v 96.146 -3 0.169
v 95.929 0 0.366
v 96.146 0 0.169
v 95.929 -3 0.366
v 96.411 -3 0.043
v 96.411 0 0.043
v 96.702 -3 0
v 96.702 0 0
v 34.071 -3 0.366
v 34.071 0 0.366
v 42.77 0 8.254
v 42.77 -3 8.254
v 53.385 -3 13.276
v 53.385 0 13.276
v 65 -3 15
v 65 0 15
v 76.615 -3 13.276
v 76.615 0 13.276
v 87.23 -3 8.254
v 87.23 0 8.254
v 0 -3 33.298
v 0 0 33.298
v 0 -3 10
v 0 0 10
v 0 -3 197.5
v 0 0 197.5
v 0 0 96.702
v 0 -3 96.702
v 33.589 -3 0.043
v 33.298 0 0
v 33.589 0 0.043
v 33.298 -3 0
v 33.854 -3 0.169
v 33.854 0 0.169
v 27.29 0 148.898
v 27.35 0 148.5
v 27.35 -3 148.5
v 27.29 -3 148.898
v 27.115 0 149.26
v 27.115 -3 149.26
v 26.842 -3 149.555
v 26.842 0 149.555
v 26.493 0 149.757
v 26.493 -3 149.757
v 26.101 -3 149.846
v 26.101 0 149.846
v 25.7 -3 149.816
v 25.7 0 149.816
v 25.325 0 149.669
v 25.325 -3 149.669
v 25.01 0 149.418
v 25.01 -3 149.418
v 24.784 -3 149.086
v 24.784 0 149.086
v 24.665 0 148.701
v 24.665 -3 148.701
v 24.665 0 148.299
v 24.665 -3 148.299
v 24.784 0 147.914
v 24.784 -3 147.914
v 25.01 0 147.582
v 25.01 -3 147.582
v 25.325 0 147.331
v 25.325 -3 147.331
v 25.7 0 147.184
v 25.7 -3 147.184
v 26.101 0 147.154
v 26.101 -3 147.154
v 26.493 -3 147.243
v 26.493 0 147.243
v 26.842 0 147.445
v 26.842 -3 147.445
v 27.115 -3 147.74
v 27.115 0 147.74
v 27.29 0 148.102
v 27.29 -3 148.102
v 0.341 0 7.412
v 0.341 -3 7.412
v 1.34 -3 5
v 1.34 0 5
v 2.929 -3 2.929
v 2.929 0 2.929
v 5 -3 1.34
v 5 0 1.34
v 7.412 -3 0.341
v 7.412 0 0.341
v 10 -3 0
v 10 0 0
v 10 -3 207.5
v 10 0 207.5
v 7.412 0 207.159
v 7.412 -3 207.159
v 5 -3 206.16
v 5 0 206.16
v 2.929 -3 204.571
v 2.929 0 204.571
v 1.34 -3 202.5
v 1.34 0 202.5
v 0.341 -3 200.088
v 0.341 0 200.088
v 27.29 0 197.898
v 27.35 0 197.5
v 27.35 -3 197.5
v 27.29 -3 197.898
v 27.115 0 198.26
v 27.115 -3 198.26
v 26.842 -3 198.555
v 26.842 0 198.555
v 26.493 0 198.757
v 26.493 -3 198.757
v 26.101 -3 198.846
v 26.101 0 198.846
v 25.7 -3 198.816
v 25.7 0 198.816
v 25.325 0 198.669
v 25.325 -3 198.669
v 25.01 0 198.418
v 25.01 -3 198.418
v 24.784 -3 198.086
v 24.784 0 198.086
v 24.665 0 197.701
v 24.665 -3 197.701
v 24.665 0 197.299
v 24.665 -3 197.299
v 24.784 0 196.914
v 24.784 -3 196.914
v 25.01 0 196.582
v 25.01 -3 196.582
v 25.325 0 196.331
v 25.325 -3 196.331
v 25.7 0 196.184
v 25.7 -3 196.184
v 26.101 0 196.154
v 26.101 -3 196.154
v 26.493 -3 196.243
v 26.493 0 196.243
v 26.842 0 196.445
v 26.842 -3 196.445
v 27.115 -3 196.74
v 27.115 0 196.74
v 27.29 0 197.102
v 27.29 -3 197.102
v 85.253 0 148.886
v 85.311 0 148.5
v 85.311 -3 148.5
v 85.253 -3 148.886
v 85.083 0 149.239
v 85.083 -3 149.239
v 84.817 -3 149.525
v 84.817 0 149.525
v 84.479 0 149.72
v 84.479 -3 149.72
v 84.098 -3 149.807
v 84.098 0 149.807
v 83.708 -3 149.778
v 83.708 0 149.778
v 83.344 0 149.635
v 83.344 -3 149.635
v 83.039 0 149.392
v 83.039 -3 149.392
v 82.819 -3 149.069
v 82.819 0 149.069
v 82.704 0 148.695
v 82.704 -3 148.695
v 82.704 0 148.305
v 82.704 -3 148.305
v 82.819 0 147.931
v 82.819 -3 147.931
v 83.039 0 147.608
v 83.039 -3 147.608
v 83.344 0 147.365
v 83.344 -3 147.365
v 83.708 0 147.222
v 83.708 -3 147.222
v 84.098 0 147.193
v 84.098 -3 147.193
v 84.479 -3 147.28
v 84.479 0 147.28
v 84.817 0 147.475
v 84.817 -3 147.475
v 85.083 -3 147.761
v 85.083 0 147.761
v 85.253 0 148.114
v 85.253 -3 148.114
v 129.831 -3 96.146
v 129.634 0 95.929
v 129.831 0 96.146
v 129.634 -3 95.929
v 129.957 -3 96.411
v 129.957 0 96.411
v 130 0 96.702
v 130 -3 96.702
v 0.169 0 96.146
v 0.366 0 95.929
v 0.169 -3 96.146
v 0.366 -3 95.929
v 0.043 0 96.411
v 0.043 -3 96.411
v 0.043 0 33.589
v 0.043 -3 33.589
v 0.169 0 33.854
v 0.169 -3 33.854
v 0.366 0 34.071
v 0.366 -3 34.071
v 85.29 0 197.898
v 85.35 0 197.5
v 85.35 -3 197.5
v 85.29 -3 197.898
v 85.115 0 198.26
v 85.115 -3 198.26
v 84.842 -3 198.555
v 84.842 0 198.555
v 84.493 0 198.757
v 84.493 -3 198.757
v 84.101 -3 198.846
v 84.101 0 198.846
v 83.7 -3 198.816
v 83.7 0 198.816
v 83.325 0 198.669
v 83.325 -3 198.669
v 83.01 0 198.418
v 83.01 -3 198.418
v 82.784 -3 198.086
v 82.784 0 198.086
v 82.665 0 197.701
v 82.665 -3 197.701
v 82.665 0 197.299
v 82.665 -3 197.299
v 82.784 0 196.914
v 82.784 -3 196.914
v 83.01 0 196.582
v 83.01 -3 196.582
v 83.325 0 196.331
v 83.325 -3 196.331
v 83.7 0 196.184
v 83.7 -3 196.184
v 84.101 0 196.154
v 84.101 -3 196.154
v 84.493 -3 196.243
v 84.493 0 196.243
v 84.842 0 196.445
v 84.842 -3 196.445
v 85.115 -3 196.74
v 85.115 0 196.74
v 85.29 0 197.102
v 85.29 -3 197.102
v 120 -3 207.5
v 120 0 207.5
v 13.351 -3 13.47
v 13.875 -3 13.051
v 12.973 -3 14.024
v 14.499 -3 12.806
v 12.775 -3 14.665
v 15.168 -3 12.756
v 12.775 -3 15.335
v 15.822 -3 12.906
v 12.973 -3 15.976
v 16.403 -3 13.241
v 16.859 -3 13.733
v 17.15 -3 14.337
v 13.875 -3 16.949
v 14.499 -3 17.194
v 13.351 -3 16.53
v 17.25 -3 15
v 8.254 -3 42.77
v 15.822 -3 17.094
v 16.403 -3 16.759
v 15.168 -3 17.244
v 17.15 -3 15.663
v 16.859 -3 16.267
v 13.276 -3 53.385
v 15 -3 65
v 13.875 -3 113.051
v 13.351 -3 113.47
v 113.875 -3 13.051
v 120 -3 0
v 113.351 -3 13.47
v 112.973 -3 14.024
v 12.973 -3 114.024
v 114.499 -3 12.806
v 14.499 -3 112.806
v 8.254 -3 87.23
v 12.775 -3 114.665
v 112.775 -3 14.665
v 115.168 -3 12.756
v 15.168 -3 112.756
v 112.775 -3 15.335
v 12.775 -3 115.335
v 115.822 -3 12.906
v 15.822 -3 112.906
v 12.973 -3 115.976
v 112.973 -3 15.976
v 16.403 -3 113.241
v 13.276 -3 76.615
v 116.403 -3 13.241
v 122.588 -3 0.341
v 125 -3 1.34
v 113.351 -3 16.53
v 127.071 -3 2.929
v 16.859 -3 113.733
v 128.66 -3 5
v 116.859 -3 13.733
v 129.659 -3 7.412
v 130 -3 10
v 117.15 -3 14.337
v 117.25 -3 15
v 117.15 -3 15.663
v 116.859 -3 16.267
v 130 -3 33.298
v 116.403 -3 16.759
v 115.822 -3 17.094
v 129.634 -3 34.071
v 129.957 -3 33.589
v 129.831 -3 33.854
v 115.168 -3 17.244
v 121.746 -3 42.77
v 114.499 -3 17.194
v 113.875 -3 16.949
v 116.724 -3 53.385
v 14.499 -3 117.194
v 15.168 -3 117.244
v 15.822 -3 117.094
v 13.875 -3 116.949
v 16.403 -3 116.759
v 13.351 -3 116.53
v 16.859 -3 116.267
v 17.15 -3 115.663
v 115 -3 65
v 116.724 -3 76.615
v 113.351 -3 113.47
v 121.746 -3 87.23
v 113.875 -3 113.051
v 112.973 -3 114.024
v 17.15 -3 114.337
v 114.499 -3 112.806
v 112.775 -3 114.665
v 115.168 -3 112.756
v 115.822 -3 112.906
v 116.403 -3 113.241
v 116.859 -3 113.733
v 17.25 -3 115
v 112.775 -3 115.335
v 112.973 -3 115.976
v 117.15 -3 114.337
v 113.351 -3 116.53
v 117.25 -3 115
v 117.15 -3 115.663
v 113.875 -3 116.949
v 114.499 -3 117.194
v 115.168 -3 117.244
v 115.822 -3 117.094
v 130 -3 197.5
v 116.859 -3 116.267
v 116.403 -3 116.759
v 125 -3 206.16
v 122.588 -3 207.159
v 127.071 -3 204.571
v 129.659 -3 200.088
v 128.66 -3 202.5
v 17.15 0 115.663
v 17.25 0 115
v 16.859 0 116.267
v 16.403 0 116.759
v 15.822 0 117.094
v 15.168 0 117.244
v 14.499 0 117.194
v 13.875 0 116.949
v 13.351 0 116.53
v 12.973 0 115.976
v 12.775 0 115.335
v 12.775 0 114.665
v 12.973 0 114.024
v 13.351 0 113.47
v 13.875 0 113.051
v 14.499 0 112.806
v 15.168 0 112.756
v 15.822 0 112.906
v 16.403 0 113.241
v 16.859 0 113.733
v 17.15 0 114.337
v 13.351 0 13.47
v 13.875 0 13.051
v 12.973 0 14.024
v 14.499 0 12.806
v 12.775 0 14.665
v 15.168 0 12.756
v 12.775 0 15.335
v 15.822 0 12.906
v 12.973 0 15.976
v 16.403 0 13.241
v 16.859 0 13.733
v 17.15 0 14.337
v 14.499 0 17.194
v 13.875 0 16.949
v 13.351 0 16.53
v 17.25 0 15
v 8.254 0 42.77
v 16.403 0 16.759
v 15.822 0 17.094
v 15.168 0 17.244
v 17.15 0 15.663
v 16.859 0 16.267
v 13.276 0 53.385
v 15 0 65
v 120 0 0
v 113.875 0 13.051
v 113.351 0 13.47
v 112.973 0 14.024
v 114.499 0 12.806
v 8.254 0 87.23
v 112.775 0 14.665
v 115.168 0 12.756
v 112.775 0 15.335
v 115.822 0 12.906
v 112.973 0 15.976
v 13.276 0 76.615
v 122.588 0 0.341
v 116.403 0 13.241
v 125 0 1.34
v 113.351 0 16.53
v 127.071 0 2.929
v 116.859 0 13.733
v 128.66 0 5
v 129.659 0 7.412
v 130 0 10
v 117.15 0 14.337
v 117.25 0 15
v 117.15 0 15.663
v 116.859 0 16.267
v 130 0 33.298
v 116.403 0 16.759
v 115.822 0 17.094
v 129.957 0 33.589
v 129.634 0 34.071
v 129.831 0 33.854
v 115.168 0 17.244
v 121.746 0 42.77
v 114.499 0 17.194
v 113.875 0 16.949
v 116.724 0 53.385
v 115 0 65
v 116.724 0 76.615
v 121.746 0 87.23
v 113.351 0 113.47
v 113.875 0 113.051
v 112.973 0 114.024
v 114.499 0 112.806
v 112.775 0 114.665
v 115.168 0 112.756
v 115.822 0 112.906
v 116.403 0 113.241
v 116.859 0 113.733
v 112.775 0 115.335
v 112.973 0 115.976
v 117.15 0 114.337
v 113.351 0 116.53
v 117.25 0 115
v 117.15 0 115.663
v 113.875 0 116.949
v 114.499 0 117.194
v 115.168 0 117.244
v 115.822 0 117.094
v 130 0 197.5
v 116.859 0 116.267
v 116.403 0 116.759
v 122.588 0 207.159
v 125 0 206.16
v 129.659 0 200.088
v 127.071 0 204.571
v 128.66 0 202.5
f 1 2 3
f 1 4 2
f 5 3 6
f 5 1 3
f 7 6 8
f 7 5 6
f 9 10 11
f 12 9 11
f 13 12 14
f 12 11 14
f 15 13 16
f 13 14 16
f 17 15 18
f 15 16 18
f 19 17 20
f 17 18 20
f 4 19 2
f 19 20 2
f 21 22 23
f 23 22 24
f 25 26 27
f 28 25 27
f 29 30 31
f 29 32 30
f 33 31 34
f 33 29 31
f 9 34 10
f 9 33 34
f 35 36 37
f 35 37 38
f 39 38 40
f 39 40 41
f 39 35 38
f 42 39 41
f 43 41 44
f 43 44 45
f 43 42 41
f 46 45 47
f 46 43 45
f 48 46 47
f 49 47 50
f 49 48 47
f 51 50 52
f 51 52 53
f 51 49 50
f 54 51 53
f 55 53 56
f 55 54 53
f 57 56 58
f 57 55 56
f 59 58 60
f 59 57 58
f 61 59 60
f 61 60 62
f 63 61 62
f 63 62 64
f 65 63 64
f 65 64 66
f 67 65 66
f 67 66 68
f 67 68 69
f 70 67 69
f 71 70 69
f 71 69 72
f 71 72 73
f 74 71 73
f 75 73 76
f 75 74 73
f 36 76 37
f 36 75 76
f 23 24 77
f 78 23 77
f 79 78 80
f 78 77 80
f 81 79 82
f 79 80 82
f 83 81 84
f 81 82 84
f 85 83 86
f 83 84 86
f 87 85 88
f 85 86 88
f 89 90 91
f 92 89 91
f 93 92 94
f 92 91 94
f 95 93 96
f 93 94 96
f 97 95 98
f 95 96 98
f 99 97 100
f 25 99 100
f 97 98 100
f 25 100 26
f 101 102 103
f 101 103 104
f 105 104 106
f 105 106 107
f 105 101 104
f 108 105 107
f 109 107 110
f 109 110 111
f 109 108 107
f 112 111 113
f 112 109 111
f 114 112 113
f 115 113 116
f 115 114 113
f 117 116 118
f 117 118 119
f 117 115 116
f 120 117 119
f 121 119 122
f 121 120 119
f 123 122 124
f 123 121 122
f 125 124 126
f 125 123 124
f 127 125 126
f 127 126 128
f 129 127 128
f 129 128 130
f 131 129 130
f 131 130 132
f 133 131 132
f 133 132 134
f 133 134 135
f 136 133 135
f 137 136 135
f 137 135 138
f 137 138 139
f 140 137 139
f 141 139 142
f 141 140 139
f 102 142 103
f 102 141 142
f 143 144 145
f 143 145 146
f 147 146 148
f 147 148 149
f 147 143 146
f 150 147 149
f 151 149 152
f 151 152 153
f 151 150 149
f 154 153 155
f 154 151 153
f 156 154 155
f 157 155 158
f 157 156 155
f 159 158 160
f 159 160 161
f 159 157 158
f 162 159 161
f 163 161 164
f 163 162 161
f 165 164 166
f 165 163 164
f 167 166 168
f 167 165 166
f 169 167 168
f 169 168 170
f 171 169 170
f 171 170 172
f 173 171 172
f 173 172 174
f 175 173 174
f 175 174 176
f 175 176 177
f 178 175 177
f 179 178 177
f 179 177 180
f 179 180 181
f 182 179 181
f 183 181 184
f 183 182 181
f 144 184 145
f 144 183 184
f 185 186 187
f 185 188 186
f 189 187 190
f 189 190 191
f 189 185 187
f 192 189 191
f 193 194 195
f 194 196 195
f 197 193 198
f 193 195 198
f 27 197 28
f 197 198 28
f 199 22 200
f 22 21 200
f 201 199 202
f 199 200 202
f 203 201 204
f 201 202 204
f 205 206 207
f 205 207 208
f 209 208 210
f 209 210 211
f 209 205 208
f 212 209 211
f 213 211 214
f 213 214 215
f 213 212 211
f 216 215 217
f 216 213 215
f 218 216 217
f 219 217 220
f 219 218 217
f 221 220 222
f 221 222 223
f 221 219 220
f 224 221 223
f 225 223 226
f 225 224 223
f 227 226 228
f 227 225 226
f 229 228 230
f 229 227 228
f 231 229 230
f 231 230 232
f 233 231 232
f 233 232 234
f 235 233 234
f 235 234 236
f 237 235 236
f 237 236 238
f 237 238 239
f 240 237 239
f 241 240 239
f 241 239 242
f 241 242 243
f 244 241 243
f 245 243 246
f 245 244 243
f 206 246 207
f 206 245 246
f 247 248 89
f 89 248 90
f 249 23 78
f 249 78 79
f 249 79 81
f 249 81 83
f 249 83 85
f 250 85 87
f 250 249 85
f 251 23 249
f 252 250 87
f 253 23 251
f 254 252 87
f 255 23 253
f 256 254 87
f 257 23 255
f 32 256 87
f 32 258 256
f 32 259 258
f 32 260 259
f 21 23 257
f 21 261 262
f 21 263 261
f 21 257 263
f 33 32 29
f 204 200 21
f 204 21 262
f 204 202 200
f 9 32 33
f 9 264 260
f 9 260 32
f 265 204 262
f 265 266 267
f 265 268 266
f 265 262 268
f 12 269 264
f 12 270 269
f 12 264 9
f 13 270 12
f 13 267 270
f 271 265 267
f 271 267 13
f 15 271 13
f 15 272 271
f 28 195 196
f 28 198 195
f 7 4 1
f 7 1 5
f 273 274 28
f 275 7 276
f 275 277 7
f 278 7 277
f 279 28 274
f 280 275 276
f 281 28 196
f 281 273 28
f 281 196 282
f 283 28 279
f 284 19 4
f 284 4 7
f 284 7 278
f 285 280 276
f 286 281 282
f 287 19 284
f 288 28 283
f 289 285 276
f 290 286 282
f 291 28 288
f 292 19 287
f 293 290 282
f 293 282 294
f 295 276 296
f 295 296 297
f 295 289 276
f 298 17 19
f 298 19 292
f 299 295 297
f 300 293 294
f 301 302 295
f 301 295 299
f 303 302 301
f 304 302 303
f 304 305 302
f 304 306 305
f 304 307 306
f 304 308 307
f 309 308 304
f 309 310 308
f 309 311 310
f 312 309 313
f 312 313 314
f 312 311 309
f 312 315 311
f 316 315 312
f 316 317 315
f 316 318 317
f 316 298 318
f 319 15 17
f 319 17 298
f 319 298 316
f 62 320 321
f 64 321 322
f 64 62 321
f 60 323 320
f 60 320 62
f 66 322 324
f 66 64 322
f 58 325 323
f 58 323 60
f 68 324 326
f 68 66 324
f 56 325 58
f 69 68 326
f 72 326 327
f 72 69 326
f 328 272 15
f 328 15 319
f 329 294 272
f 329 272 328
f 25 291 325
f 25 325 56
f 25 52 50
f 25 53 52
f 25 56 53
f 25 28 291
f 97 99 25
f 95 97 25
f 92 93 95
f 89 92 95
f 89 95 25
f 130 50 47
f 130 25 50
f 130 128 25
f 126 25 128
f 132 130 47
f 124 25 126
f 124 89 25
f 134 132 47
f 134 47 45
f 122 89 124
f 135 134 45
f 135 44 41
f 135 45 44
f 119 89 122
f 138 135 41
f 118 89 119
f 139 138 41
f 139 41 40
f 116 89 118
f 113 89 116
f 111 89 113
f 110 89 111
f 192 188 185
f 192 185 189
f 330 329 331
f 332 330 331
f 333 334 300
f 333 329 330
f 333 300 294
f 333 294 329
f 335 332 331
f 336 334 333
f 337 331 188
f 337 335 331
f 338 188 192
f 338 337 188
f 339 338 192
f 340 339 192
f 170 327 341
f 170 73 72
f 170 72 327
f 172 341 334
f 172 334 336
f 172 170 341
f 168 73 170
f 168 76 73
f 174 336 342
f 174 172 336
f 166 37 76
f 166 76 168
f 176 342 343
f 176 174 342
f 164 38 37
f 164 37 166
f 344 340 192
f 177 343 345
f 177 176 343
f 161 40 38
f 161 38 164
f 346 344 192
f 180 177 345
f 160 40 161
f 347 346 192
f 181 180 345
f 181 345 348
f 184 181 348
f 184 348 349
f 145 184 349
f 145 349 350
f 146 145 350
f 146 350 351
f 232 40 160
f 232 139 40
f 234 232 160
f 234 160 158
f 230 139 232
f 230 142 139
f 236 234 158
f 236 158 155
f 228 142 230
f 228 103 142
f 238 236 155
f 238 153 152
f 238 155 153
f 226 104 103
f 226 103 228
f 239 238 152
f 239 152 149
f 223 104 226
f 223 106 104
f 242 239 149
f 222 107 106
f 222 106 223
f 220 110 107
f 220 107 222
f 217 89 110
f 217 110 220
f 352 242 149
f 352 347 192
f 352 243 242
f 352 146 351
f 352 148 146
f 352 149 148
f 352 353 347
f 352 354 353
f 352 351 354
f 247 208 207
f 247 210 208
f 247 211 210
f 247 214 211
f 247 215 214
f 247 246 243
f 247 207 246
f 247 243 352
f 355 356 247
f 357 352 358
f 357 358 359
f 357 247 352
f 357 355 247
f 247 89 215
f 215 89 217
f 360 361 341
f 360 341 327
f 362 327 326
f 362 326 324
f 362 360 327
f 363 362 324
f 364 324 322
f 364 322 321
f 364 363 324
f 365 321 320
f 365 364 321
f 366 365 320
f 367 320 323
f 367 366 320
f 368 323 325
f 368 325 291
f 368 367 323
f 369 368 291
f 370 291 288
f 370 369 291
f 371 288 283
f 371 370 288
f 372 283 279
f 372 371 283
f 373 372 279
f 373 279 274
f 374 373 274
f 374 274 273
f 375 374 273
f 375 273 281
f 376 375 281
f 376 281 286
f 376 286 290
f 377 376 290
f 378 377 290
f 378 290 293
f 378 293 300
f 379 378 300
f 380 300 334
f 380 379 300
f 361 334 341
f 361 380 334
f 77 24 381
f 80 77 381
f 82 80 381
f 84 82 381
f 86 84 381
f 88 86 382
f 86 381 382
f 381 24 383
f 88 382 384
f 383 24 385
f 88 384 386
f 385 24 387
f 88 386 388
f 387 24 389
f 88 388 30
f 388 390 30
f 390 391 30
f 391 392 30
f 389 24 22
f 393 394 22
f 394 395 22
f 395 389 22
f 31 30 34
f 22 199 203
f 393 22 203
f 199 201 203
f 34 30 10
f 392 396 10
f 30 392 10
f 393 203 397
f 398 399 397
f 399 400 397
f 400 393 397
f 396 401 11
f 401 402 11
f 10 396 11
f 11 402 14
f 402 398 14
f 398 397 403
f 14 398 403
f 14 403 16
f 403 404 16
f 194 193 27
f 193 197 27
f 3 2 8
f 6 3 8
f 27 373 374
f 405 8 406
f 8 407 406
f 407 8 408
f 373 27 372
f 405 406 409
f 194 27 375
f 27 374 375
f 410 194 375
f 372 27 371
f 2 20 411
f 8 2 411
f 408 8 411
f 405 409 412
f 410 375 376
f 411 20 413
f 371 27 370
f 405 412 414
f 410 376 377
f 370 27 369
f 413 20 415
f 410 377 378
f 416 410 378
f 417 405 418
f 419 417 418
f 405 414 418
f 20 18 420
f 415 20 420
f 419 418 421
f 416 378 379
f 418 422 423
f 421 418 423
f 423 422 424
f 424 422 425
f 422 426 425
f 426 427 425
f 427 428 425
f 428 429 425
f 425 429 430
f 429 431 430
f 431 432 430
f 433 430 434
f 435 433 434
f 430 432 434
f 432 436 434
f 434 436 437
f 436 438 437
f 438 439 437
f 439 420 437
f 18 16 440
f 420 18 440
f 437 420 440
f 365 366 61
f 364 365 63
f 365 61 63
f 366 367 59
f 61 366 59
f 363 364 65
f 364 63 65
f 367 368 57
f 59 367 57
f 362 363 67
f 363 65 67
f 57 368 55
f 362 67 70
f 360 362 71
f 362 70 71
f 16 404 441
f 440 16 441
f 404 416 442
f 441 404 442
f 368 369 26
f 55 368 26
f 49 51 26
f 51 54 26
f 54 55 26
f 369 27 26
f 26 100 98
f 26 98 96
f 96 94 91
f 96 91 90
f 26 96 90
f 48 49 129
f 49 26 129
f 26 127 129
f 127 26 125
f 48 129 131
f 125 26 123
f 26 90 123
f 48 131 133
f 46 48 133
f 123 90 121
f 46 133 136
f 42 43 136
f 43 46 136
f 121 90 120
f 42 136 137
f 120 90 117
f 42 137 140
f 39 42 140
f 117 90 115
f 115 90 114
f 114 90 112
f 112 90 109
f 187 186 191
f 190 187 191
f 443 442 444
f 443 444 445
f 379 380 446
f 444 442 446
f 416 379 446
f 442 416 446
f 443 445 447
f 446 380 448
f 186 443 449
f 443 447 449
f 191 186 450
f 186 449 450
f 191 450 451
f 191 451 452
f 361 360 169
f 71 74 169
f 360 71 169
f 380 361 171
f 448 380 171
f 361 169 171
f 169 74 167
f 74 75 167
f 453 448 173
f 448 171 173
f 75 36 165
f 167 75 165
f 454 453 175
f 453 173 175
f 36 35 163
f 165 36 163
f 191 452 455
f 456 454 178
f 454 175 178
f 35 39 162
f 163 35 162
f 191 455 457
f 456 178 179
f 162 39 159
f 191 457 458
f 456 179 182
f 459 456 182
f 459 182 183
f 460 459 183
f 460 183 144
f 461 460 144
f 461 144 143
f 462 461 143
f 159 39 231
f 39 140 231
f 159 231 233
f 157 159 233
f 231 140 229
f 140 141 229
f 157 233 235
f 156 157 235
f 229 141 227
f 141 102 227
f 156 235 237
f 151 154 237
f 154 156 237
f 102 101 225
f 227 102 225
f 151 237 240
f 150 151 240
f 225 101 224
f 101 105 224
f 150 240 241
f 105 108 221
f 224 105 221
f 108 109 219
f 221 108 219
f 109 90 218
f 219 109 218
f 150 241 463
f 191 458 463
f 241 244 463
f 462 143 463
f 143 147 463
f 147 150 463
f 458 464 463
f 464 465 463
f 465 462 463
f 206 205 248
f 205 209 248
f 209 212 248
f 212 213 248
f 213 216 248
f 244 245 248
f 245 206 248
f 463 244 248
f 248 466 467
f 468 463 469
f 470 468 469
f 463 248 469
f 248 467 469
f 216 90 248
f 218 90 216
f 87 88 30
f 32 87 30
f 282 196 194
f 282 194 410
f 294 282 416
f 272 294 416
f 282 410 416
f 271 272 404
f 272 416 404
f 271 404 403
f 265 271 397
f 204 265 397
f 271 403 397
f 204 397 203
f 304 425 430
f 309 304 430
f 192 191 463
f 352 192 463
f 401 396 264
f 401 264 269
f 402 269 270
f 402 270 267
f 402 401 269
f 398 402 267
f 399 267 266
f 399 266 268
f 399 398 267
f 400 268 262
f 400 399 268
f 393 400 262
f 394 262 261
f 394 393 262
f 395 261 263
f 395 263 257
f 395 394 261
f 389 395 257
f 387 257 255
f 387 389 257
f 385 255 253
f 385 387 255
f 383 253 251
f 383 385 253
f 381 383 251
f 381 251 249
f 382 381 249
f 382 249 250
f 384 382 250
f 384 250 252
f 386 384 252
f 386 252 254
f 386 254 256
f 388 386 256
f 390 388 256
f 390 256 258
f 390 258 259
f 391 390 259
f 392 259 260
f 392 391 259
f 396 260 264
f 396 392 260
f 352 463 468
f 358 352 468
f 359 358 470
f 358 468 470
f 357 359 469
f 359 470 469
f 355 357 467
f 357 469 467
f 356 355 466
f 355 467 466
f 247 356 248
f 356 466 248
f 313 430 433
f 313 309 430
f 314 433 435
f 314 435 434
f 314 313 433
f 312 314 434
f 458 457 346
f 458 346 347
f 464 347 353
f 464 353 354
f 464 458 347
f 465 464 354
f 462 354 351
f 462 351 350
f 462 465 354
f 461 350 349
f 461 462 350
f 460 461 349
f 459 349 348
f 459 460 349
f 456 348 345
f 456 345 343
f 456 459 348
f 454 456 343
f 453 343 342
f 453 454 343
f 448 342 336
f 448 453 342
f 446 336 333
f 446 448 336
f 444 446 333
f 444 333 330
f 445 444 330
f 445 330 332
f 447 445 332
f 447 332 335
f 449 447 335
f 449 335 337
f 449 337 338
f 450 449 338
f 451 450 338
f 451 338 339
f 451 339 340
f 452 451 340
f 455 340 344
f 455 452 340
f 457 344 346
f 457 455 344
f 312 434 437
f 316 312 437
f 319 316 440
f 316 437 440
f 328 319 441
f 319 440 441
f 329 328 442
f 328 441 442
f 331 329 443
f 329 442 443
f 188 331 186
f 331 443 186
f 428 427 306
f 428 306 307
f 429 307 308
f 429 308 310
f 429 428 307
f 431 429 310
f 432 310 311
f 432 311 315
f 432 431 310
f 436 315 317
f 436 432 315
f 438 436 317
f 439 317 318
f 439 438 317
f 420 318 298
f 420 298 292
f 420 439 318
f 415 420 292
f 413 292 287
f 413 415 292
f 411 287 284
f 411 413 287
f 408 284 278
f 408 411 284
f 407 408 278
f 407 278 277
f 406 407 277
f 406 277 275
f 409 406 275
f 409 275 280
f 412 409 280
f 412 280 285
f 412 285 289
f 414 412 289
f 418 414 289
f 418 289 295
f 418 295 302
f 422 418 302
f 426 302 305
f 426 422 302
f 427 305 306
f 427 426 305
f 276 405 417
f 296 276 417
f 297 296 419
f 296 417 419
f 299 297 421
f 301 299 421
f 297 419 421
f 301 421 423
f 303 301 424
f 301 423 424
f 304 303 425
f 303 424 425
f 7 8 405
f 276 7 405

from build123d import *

# Parameters (mm, degrees)
F0_R     = 2.25
F0_R_2   = 1.35
F0_R_3   = 1.3110502125
F1_DEPTH = 3
F2_R     = 1


with BuildPart() as f1:
    # F0 (on Front) → F1 (new body)
    with BuildSketch(Plane.XZ):
        with BuildLine():
            ThreePointArc((0, 10), (2.9289321881, 2.9289321881), (10, 0))
            Line((10, 0), (33.775010008, 0))
            ThreePointArc((33.775010008, 0), (65, 15), (96.224989992, 0))
            Line((96.224989992, 0), (120, 0))
            ThreePointArc((120, 0), (127.0710678119, 2.9289321881), (130, 10))
            Line((130, 10), (130, 33.775010008))
            ThreePointArc((130, 33.775010008), (115, 65), (130, 96.224989992))
            Line((130, 96.224989992), (130, 197.5))
            ThreePointArc((130, 197.5), (127.0710678119, 204.5710678119), (120, 207.5))
            Line((120, 207.5), (10, 207.5))
            ThreePointArc((10, 207.5), (2.9289321881, 204.5710678119), (0, 197.5))
            Line((0, 197.5), (0, 96.224989992))
            ThreePointArc((0, 96.224989992), (15, 65), (0, 33.775010008))
            Line((0, 33.775010008), (0, 10))
        make_face()
        with Locations((15, 15)):
            Circle(F0_R, mode=Mode.SUBTRACT)
        with Locations((115, 15)):
            Circle(F0_R, mode=Mode.SUBTRACT)
        with Locations((15, 115)):
            Circle(F0_R, mode=Mode.SUBTRACT)
        with Locations((26, 148.5)):
            Circle(F0_R_2, mode=Mode.SUBTRACT)
        with Locations((26, 197.5)):
            Circle(F0_R_2, mode=Mode.SUBTRACT)
        with Locations((84, 148.5)):
            Circle(F0_R_3, mode=Mode.SUBTRACT)
        with Locations((115, 115)):
            Circle(F0_R, mode=Mode.SUBTRACT)
        with Locations((84, 197.5)):
            Circle(F0_R_2, mode=Mode.SUBTRACT)
    extrude(amount=F1_DEPTH)

    # F2
    f2_edges = [f1.edges().sort_by_distance(p)[0] for p in [
        (0, -1.5, 33.77501),
        (130, -1.5, 96.22499),
        (33.77501, -1.5, 0),
        (96.22499, -1.5, 0),
        (130, -1.5, 33.77501),
        (0, -1.5, 96.22499),
    ]]
    fillet(f2_edges, radius=F2_R)


solid = f1.part
